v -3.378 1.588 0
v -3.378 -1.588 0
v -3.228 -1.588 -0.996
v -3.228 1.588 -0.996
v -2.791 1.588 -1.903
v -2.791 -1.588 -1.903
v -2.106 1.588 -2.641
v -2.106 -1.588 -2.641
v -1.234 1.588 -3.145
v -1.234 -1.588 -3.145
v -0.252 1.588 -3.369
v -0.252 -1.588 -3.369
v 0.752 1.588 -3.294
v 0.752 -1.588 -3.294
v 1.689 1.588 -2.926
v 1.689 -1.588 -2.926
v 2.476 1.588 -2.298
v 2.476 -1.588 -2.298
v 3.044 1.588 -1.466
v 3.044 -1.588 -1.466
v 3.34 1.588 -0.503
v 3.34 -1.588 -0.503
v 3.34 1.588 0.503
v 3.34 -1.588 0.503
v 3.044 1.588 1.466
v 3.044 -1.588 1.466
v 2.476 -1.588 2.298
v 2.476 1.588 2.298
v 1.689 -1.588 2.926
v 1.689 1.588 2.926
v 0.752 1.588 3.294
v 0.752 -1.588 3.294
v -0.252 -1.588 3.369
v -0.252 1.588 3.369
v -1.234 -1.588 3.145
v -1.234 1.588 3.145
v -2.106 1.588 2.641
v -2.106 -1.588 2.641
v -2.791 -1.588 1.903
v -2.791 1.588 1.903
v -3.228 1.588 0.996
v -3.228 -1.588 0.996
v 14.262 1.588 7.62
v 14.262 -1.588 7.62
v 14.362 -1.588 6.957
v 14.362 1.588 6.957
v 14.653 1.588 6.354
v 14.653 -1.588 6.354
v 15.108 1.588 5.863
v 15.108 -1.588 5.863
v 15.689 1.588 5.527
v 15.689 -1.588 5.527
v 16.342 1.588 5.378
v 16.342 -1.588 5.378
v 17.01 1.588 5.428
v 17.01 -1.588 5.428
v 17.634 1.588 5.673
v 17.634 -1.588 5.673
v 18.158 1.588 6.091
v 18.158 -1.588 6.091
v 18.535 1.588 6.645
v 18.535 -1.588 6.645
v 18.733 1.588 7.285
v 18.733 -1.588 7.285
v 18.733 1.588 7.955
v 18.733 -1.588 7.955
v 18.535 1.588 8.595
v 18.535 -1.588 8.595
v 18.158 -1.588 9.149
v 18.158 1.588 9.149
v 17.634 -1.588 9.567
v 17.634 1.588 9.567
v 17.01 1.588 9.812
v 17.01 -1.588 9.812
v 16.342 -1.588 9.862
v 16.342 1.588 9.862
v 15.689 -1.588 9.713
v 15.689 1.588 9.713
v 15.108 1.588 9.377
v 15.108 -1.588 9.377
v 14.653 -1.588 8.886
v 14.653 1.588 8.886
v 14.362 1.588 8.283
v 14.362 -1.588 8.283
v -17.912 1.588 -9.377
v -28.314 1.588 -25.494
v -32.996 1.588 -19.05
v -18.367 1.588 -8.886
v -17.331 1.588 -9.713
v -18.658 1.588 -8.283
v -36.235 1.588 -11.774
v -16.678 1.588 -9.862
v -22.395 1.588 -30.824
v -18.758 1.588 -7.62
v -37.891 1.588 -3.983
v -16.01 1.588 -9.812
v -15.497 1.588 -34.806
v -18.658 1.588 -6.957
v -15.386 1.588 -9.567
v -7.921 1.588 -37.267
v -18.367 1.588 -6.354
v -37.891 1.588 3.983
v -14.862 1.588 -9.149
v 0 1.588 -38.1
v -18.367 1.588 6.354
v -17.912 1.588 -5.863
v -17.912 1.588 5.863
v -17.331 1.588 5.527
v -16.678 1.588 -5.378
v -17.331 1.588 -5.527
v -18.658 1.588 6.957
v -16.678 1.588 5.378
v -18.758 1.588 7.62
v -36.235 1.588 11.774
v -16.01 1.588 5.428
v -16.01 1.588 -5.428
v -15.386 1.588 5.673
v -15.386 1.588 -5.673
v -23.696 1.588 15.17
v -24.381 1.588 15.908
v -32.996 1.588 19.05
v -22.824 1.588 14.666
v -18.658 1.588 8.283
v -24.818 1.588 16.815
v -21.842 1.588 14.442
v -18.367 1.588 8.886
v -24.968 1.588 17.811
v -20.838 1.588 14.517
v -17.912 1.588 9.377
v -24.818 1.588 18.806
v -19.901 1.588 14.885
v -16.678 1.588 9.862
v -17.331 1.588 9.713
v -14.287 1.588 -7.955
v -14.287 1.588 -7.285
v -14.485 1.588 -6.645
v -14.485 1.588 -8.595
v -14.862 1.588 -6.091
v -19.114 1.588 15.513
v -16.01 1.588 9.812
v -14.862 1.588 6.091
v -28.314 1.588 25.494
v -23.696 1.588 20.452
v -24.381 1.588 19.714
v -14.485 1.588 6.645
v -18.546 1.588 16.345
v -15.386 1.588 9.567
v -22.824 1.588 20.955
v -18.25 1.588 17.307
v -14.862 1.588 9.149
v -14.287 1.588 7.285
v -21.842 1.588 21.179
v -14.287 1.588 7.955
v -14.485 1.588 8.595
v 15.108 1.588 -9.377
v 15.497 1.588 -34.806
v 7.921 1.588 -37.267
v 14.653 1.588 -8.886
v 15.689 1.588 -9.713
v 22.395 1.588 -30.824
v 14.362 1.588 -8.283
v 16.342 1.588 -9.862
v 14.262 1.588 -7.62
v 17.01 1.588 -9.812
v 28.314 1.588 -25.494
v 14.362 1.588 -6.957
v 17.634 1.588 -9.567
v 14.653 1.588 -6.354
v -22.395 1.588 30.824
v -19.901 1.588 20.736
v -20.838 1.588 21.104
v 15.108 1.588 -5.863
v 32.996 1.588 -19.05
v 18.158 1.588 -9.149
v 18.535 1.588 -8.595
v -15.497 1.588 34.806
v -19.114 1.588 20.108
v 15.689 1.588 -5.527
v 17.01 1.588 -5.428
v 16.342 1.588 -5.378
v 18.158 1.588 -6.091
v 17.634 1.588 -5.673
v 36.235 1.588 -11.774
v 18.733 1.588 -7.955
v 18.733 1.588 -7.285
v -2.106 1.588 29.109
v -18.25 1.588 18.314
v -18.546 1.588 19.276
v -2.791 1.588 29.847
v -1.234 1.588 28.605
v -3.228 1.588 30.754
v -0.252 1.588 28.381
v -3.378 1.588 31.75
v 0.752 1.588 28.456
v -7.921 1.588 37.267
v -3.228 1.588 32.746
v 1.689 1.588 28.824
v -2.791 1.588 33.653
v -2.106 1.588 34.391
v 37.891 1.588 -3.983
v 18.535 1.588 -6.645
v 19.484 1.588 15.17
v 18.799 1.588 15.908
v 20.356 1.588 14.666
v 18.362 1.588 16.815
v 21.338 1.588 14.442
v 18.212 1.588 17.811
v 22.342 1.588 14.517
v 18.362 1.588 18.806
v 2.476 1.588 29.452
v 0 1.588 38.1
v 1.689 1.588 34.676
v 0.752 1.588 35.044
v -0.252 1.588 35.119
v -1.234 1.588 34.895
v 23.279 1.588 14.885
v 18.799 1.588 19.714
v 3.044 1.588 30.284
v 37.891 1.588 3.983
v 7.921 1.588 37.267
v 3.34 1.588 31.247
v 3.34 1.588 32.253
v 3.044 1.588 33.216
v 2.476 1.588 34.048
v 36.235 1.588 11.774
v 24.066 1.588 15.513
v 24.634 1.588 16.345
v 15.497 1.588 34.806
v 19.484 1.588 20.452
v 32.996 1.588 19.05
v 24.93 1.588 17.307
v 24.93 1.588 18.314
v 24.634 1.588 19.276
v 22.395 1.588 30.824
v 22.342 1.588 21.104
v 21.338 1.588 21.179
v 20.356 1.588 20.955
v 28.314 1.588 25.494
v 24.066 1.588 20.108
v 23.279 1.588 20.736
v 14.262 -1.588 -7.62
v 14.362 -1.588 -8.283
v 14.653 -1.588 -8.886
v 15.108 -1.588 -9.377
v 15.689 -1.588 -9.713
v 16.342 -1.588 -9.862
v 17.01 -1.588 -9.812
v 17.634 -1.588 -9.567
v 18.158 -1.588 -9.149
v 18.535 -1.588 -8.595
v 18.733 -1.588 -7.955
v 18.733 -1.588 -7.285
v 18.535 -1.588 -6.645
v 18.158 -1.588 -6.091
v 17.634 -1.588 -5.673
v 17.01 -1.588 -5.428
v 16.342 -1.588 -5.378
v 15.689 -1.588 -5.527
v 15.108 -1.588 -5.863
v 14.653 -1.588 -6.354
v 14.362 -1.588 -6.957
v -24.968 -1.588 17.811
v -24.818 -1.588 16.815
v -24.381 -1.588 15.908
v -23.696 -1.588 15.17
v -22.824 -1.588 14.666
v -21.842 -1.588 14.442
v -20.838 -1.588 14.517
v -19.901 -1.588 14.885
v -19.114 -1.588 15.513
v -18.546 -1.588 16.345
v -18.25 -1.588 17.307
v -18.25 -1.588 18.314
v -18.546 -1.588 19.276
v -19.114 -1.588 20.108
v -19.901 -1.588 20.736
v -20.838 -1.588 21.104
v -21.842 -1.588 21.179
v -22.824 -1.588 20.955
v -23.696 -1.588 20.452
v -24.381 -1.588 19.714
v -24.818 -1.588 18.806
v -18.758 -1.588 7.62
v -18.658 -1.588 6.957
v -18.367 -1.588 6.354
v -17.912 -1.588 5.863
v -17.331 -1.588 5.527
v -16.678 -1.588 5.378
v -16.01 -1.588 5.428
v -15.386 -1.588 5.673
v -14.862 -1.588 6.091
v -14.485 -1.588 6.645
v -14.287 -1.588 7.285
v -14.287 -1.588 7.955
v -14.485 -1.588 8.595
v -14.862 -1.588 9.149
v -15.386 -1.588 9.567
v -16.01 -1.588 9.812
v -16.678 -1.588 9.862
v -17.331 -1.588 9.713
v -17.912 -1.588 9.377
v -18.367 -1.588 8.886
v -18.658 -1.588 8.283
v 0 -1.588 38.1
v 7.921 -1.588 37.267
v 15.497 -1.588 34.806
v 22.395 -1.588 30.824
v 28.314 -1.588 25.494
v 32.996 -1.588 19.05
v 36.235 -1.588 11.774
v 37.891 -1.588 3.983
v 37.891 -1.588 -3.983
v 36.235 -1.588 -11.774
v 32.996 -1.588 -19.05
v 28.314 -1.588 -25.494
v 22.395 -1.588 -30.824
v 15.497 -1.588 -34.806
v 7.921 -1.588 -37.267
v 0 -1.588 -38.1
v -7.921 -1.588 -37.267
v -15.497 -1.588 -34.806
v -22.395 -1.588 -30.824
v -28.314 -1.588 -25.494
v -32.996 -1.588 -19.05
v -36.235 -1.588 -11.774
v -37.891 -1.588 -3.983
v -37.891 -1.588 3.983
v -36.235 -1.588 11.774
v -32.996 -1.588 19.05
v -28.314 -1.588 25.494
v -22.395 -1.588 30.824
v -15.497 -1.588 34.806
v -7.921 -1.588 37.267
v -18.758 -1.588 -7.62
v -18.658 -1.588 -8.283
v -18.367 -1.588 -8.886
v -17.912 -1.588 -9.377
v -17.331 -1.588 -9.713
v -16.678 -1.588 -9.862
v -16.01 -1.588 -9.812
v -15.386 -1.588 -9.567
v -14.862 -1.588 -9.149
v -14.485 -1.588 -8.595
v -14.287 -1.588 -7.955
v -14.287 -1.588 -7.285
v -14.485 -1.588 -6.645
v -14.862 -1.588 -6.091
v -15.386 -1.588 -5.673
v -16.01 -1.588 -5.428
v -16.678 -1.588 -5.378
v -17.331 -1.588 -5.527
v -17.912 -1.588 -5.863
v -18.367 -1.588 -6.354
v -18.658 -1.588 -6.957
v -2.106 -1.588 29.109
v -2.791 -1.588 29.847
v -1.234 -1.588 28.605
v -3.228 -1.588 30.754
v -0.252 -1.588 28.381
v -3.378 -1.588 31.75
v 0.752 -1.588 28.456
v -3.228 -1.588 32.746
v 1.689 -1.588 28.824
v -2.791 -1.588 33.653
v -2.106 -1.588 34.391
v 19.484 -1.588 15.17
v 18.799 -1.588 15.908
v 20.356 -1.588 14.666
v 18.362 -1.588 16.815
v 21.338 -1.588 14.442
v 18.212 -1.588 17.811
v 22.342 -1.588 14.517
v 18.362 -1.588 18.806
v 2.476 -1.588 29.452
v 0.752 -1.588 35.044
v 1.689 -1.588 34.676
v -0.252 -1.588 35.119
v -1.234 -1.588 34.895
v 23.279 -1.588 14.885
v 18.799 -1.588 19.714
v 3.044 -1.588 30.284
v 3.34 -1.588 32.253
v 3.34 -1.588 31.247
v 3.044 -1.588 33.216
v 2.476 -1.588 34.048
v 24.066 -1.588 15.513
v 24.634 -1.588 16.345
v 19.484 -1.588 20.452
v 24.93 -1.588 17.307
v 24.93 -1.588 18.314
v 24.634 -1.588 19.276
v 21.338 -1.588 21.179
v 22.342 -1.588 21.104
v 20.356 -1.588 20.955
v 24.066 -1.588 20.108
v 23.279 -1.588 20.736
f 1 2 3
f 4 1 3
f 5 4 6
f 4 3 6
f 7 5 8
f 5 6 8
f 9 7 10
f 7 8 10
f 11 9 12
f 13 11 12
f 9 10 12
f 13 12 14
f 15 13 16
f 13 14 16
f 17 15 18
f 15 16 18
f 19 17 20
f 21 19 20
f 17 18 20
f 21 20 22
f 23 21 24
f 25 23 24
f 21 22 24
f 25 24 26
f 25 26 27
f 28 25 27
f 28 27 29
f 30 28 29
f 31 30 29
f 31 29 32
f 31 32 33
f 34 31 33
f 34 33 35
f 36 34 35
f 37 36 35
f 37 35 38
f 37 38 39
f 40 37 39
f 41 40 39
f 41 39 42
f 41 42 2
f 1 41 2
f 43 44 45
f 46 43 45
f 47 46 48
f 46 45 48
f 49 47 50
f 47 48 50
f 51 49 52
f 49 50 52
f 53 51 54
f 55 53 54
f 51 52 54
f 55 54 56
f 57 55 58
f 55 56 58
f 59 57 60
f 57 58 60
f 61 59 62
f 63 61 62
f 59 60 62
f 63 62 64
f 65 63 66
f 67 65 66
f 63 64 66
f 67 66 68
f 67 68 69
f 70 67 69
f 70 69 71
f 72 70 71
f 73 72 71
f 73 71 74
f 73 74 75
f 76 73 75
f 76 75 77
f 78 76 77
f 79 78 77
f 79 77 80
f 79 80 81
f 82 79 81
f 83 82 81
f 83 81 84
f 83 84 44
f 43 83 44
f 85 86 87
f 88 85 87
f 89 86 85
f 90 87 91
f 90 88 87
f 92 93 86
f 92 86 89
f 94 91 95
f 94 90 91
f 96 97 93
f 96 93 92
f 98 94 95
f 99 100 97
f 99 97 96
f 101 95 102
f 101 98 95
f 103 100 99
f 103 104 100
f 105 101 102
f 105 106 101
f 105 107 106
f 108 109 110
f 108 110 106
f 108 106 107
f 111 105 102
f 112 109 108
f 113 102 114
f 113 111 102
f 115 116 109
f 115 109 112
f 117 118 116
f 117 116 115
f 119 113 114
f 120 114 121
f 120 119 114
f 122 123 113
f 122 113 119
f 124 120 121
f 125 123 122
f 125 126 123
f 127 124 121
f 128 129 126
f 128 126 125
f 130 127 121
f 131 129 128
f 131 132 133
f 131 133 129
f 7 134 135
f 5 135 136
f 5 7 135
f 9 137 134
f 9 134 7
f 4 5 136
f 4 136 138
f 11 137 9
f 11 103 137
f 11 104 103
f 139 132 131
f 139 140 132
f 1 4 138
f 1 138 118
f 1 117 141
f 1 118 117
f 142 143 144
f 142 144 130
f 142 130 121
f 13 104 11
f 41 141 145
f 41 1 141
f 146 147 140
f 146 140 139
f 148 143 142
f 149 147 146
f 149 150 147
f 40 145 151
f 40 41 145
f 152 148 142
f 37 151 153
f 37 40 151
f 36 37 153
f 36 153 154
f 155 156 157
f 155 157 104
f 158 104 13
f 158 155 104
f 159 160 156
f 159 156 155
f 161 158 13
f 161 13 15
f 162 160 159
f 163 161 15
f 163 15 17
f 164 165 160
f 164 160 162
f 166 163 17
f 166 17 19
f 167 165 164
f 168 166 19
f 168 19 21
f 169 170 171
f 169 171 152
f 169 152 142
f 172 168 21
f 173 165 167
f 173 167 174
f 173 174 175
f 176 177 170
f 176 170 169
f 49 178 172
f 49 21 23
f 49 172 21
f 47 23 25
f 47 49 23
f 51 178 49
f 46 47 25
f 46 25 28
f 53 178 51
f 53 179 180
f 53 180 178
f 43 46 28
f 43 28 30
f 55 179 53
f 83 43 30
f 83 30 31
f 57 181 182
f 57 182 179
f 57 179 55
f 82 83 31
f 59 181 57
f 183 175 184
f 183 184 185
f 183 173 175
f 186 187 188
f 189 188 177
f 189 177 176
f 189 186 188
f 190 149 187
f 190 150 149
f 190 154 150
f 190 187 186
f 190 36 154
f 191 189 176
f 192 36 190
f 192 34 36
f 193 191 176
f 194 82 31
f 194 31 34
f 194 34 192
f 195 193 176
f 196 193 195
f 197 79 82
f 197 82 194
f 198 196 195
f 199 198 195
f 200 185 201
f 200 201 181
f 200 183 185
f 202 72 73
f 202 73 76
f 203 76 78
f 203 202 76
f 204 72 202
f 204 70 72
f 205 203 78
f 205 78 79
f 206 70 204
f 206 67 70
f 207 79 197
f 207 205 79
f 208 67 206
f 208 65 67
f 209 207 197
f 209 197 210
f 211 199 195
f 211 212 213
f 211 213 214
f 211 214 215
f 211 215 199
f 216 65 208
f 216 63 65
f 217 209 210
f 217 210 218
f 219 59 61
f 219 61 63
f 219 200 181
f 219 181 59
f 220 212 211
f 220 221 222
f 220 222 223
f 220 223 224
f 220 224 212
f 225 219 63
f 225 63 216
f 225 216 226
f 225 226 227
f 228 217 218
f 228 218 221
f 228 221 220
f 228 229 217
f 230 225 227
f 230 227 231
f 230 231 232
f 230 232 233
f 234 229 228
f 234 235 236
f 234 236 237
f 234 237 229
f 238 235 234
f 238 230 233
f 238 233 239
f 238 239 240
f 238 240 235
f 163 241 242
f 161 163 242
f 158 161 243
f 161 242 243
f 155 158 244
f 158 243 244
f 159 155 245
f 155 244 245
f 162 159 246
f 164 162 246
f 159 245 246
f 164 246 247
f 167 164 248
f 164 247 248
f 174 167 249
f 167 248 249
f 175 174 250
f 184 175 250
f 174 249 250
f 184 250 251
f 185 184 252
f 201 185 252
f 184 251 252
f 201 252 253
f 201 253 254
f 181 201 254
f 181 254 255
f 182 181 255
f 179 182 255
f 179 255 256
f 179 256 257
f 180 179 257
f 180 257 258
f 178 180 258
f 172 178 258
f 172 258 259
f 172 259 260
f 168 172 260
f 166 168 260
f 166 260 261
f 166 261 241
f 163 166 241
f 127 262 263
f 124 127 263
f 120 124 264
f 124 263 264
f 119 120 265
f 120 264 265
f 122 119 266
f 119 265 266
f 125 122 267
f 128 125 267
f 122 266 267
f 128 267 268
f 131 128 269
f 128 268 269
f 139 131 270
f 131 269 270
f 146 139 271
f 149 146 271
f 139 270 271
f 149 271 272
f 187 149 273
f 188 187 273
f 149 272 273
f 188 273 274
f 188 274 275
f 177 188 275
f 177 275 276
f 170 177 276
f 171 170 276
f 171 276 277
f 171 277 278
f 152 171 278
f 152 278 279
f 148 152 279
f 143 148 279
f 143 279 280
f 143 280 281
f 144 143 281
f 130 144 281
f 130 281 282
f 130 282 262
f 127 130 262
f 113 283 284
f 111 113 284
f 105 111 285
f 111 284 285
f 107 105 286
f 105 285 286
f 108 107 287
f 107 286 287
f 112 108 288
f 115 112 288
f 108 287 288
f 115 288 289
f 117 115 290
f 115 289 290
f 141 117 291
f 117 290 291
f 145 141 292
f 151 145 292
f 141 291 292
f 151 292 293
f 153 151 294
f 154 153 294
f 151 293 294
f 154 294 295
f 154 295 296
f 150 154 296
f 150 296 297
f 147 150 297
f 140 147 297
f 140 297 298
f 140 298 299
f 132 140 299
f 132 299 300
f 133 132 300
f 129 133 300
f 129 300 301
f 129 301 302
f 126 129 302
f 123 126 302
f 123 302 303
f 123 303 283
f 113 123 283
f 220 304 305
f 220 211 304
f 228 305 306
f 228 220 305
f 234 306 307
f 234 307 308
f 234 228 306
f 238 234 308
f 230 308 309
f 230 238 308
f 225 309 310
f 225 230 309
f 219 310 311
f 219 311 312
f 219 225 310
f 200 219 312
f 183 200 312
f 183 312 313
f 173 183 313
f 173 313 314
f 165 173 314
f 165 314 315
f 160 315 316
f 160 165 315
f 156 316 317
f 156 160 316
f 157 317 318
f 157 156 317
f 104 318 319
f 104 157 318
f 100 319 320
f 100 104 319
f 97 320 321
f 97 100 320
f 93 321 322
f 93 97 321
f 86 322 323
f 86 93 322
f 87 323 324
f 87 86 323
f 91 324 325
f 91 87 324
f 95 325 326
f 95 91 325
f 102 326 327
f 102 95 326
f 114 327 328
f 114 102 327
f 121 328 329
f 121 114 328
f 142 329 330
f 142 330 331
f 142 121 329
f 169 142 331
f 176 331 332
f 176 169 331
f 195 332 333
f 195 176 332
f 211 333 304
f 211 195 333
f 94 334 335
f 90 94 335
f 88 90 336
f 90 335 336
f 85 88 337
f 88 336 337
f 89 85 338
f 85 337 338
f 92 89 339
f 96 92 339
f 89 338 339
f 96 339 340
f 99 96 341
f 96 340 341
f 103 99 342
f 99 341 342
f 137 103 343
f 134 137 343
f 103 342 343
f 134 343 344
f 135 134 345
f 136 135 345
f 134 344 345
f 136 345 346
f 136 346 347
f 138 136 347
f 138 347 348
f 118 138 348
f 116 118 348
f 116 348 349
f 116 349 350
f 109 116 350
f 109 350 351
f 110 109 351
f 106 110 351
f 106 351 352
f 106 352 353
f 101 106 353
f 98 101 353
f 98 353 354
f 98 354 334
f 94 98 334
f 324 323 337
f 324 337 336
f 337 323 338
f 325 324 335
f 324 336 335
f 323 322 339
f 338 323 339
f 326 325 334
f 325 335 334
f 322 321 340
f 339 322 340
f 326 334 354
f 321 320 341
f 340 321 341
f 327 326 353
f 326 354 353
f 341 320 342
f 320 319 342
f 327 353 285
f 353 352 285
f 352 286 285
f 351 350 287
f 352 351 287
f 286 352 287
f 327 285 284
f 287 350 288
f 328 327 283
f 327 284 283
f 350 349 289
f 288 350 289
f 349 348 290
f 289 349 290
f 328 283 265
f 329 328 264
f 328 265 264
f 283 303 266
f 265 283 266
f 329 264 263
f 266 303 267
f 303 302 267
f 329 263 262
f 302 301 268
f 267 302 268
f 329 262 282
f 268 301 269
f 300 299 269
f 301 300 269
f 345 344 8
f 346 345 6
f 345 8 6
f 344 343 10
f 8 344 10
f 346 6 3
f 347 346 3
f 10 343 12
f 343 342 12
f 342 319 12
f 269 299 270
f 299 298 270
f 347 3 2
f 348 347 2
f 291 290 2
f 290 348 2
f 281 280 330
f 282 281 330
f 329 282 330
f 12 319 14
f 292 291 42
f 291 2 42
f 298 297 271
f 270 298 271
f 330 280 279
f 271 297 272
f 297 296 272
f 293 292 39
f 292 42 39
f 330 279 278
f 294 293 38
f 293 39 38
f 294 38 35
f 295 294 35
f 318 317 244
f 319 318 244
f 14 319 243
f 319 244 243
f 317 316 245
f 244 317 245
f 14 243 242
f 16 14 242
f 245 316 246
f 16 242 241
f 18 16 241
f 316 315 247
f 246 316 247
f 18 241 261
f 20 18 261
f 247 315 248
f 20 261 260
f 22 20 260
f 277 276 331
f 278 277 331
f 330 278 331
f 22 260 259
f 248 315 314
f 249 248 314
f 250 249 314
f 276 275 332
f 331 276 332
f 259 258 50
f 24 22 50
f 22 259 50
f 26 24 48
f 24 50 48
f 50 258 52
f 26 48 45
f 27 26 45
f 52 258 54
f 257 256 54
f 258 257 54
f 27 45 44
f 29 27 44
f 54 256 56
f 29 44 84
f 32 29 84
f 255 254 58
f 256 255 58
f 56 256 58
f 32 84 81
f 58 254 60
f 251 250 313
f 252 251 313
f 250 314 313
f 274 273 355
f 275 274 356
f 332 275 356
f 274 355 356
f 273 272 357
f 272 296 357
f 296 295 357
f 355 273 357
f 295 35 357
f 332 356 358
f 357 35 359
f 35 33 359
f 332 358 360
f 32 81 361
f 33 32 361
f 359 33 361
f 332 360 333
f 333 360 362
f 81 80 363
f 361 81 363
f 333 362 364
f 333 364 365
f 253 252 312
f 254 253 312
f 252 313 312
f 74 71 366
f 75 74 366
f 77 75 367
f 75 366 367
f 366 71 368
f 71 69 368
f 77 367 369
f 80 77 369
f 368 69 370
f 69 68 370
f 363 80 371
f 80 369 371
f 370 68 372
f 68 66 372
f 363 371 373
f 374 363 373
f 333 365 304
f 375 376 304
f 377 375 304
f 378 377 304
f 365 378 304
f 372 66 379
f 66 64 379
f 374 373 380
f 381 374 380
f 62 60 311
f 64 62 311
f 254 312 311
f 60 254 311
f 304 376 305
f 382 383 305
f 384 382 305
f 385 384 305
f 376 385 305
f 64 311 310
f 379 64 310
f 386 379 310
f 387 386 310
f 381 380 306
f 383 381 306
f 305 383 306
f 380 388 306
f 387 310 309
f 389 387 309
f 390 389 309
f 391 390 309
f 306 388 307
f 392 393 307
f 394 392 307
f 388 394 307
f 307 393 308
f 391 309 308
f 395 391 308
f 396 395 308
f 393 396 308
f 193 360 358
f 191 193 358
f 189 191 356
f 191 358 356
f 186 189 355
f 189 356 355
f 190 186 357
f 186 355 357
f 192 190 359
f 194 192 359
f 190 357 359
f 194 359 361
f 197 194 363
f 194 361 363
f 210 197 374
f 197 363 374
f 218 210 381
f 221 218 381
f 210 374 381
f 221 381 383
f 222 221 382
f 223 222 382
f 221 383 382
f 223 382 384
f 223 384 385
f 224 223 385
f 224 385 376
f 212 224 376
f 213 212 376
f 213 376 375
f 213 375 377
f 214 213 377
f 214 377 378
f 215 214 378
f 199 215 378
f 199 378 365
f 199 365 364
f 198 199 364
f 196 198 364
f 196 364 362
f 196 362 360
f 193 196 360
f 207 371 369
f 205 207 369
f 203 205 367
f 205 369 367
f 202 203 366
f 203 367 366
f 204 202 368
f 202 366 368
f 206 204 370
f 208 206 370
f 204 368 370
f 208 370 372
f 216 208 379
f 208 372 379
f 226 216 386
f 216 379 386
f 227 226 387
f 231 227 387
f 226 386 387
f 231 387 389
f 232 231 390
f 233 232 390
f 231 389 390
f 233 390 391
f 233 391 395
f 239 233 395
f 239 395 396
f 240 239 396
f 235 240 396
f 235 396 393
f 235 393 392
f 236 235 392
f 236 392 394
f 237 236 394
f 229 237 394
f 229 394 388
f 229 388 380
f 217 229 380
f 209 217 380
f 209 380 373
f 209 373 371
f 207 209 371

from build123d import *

# Parameters (mm, degrees)
SKETCH1_R               = 38.1
BOSS_EXTRUDE1_DEPTH     = 1.5875
F_1_4_CLEARANCE_HOLE1_D = 6.7564
F_1_4_CLEARANCE_HOLE2_D = 6.7564
F_1_4_CLEARANCE_HOLE3_D = 6.7564
F_8_CLEARANCE_HOLE1_D   = 4.4958


with BuildPart() as part:
    # Sketch1 → Boss-Extrude1 (new, symmetric)
    with BuildSketch(Plane(origin=(0, 0, 0), x_dir=(1, 0, 0), z_dir=(0, 1, 0))):
        with Locations(Location((0, 0, 0), (0, 0, 270))):
            Circle(SKETCH1_R)
    extrude(amount=BOSS_EXTRUDE1_DEPTH, both=True)

    # 1/4 Clearance Hole1 (through all)
    with Locations(Plane(origin=(0, 1.5875, 0), x_dir=(1, 0, 0), z_dir=(0, 1, 0))):
        with Locations((-21.59, -17.810706314), (21.59, -17.810706314)):
            Hole(F_1_4_CLEARANCE_HOLE1_D / 2)

    # 1/4 Clearance Hole2 (through all)
    with Locations(Plane(origin=(0, 1.5875, 0), x_dir=(1, 0, 0), z_dir=(0, 1, 0))):
        with Locations((0, 0)):
            Hole(F_1_4_CLEARANCE_HOLE2_D / 2)

    # 1/4 Clearance Hole3 (through all)
    with Locations(Plane(origin=(0, 1.5875, 0), x_dir=(1, 0, 0), z_dir=(0, 1, 0))):
        with Locations((0, -31.75)):
            Hole(F_1_4_CLEARANCE_HOLE3_D / 2)

    # #8 Clearance Hole1 (through all)
    with Locations(Plane(origin=(0, 1.5875, 0), x_dir=(1, 0, 0), z_dir=(0, 1, 0))):
        with Locations((-16.51, 7.62), (-16.51, -7.62), (16.51, -7.62), (16.51, 7.62)):
            Hole(F_8_CLEARANCE_HOLE1_D / 2)


solid = part.part
